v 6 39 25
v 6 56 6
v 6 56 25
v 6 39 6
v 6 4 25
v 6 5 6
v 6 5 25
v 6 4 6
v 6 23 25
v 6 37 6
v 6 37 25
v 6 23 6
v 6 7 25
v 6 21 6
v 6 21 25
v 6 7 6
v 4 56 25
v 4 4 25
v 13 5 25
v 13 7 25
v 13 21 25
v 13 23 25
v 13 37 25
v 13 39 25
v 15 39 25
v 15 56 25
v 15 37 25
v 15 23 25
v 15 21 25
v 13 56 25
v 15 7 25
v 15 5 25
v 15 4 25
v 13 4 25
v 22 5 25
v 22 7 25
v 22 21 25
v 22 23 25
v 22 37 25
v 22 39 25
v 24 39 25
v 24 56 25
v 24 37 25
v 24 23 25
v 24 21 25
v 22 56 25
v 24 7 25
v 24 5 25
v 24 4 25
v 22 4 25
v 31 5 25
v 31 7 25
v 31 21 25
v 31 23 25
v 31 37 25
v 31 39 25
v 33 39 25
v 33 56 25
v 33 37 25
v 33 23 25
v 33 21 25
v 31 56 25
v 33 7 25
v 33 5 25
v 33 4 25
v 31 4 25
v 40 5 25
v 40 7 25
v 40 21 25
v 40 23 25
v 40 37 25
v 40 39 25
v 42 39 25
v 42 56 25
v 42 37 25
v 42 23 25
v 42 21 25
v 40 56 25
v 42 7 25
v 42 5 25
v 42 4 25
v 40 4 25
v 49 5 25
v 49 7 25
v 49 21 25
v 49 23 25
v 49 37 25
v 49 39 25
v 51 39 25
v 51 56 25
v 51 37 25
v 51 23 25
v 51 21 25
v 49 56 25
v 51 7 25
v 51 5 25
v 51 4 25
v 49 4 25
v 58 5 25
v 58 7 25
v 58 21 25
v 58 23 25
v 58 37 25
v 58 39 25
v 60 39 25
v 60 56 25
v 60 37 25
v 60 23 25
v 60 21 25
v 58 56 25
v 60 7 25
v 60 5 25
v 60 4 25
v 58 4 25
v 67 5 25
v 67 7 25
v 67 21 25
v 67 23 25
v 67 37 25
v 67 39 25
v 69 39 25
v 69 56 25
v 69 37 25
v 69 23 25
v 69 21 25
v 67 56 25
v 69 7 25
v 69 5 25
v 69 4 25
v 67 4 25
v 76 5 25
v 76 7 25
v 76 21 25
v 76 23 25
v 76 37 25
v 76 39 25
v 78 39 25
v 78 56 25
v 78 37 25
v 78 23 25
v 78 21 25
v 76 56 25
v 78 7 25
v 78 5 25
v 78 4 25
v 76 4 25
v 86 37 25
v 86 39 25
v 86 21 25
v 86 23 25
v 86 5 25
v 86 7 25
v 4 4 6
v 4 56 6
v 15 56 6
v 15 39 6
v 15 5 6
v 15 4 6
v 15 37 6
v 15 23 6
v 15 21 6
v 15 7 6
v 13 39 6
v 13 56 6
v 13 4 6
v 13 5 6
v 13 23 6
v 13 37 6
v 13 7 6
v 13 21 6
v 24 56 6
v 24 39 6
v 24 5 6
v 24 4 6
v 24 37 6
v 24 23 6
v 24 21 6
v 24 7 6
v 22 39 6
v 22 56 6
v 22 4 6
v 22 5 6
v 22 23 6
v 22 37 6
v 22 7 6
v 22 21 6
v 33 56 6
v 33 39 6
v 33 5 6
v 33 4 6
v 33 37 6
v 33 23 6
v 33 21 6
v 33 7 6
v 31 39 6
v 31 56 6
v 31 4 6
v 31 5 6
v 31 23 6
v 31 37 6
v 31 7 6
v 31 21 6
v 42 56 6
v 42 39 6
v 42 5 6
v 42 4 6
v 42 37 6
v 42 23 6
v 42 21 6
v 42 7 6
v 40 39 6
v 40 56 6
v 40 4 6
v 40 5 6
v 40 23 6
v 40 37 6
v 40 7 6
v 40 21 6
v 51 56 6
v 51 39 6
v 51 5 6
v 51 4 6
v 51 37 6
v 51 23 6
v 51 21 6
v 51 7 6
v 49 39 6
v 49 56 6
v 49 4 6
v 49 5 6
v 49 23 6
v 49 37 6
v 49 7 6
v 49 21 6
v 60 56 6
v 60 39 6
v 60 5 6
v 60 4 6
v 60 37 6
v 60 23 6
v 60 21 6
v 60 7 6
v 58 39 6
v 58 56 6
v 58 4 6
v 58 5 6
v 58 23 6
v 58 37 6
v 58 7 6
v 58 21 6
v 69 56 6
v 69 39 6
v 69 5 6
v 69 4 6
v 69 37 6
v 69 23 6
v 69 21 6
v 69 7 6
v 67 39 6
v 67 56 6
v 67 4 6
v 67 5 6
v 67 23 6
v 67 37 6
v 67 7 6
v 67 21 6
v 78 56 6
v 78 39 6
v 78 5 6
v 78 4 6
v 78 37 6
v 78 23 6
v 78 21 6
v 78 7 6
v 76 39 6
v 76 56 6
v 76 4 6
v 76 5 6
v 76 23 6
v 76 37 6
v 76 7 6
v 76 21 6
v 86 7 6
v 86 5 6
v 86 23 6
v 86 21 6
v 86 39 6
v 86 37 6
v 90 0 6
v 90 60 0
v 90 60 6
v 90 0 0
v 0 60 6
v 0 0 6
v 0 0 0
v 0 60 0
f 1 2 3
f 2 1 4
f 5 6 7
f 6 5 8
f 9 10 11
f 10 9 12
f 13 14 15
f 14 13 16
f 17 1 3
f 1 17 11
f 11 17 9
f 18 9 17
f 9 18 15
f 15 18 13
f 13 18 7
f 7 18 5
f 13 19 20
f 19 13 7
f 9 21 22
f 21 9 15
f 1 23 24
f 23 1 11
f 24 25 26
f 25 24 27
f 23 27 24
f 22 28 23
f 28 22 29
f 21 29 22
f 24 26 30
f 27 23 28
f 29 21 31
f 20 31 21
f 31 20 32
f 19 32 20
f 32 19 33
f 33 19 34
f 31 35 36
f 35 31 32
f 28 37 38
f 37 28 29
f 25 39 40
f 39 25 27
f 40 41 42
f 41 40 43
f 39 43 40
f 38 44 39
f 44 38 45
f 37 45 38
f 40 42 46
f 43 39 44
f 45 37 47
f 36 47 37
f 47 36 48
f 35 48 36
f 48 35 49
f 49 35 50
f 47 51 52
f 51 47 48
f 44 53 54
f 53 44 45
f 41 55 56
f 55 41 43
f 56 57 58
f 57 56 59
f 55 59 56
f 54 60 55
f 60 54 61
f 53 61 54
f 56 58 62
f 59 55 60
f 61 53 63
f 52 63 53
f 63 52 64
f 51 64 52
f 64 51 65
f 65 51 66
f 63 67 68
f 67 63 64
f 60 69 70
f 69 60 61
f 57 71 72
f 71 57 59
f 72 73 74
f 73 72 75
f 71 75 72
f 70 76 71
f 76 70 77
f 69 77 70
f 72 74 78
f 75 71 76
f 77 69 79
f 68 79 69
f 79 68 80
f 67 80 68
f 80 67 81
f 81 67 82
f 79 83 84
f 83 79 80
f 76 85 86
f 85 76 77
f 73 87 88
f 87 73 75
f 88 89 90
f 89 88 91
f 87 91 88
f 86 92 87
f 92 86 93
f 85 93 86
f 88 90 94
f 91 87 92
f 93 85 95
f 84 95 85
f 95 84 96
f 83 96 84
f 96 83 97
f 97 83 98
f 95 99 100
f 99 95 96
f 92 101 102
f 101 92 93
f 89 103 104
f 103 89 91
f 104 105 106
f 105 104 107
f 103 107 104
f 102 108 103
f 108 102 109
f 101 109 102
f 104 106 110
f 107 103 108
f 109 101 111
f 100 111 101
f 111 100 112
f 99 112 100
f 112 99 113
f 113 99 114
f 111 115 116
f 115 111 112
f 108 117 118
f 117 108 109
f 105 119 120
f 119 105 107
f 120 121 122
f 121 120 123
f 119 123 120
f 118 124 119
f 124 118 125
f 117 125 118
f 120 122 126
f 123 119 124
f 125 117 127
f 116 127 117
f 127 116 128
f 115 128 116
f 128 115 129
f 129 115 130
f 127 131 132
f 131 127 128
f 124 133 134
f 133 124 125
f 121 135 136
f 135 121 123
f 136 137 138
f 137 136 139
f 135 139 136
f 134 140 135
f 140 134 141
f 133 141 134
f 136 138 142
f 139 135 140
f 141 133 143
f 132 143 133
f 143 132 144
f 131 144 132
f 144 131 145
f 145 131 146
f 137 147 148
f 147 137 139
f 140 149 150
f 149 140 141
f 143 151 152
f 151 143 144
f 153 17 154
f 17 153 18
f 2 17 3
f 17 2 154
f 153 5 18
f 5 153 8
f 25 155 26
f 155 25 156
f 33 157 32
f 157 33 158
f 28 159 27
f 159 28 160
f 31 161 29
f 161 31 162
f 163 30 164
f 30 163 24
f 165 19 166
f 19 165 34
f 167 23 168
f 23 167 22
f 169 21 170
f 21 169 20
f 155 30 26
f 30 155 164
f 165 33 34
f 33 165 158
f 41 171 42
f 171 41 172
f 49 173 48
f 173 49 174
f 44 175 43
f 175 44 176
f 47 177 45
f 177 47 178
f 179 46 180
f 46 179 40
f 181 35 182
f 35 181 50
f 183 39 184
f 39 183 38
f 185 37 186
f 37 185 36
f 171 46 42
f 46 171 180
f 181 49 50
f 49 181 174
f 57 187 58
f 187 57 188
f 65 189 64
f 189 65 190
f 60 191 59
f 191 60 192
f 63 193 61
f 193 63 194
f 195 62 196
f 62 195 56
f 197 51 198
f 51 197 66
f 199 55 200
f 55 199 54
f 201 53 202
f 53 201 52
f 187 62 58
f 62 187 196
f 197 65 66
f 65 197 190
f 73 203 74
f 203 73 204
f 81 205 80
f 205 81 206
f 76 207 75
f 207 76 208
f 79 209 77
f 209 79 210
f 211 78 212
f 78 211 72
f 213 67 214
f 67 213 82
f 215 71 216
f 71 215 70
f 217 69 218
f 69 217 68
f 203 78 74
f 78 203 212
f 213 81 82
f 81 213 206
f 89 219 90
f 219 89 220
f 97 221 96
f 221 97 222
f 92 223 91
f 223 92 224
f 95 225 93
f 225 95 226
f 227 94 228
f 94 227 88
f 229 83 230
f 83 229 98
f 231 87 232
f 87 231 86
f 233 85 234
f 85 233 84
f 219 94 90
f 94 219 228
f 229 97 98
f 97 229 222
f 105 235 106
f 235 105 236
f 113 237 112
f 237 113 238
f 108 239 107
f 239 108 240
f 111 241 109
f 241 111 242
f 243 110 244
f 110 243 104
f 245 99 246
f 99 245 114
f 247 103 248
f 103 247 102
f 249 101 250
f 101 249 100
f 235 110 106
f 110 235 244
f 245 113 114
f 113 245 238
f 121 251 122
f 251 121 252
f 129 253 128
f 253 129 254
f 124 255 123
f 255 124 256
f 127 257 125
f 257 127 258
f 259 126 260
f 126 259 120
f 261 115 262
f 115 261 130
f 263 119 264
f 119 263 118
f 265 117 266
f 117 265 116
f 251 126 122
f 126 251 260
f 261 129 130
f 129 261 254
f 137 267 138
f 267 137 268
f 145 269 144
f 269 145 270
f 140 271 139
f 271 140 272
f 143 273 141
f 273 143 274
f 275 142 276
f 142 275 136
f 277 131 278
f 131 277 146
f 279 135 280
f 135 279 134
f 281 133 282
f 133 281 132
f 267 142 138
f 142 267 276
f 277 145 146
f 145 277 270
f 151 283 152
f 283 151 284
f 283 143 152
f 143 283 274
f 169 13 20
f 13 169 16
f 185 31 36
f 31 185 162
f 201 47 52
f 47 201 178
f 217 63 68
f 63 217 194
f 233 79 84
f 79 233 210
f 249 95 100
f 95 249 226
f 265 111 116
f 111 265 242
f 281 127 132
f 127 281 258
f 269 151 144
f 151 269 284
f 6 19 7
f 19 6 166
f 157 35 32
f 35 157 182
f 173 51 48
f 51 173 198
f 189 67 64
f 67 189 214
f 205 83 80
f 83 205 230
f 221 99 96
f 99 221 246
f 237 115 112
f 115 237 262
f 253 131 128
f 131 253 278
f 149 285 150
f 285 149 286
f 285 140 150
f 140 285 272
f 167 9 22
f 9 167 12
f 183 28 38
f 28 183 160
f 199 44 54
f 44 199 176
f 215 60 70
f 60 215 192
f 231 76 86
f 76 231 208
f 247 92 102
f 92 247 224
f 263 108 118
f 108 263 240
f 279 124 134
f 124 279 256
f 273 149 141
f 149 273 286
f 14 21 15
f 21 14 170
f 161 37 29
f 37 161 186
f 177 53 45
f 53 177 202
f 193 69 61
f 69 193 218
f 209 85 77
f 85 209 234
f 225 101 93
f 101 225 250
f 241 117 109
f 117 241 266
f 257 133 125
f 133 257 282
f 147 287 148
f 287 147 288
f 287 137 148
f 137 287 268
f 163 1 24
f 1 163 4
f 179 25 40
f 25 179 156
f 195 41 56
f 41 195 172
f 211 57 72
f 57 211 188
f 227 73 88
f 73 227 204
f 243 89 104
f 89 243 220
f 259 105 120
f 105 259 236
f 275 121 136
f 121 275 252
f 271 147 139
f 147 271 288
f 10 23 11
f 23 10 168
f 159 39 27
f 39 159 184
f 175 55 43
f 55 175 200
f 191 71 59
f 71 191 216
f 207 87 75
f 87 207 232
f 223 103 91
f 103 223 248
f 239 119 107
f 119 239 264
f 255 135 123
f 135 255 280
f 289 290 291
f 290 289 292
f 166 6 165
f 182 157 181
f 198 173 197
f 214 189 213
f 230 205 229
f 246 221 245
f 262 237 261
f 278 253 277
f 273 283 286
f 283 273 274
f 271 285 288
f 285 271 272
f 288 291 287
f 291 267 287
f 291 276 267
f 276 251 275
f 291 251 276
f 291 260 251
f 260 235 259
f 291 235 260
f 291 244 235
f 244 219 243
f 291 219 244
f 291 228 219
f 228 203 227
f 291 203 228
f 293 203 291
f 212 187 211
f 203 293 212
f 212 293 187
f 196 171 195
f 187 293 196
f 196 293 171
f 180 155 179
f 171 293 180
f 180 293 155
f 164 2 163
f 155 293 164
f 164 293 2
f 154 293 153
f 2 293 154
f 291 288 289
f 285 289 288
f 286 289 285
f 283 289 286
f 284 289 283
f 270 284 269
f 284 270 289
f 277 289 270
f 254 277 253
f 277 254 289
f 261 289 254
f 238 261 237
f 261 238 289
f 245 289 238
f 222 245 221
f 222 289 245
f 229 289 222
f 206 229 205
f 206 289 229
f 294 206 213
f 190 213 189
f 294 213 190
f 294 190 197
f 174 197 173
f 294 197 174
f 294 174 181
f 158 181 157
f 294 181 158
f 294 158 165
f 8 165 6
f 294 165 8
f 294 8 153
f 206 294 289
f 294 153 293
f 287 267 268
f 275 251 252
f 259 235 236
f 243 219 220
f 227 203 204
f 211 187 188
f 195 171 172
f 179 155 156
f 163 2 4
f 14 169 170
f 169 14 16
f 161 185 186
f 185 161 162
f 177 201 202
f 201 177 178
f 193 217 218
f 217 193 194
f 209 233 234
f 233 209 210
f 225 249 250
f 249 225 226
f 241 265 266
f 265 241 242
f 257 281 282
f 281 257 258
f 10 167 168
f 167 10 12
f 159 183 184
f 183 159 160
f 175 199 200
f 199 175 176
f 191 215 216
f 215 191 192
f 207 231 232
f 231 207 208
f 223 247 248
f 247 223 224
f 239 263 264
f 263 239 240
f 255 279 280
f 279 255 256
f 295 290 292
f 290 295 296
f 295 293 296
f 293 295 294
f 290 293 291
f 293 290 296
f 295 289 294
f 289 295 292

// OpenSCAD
$fn = 32;

// ----------------------------------------------------------------------
// Heatsink: cross fin block
// ----------------------------------------------------------------------

// --- parameters (mm) ---
base_l = 90;              // base length, X
base_w = 60;              // base width, Y
base_t = 6;               // base plate thickness
fin_h = 20;               // fin height above the base
fin_t = 2;                // fin thickness
edge = 4;                 // margin from the base ends
pitch = 9;                // fin pitch
rib_pitch = 16;           // cross rib pitch

n_fins = floor((base_l - 2 * edge - fin_t) / pitch) + 1;  // fin count
total_h = base_t + fin_h - 1;  // overall height
n_ribs = floor((base_w - 2 * edge) / rib_pitch);  // rib count

union() {
  cube([base_l, base_w, base_t]);
  for (i = [0 : n_fins - 1])
    translate([edge + i * pitch, edge, base_t - 1])
      cube([fin_t, base_w - 2 * edge, fin_h]);
  for (i = [0 : n_ribs - 1])
    translate([edge, edge + 1 + i * rib_pitch, base_t - 1])
      cube([base_l - 2 * edge, fin_t, fin_h]);
}
